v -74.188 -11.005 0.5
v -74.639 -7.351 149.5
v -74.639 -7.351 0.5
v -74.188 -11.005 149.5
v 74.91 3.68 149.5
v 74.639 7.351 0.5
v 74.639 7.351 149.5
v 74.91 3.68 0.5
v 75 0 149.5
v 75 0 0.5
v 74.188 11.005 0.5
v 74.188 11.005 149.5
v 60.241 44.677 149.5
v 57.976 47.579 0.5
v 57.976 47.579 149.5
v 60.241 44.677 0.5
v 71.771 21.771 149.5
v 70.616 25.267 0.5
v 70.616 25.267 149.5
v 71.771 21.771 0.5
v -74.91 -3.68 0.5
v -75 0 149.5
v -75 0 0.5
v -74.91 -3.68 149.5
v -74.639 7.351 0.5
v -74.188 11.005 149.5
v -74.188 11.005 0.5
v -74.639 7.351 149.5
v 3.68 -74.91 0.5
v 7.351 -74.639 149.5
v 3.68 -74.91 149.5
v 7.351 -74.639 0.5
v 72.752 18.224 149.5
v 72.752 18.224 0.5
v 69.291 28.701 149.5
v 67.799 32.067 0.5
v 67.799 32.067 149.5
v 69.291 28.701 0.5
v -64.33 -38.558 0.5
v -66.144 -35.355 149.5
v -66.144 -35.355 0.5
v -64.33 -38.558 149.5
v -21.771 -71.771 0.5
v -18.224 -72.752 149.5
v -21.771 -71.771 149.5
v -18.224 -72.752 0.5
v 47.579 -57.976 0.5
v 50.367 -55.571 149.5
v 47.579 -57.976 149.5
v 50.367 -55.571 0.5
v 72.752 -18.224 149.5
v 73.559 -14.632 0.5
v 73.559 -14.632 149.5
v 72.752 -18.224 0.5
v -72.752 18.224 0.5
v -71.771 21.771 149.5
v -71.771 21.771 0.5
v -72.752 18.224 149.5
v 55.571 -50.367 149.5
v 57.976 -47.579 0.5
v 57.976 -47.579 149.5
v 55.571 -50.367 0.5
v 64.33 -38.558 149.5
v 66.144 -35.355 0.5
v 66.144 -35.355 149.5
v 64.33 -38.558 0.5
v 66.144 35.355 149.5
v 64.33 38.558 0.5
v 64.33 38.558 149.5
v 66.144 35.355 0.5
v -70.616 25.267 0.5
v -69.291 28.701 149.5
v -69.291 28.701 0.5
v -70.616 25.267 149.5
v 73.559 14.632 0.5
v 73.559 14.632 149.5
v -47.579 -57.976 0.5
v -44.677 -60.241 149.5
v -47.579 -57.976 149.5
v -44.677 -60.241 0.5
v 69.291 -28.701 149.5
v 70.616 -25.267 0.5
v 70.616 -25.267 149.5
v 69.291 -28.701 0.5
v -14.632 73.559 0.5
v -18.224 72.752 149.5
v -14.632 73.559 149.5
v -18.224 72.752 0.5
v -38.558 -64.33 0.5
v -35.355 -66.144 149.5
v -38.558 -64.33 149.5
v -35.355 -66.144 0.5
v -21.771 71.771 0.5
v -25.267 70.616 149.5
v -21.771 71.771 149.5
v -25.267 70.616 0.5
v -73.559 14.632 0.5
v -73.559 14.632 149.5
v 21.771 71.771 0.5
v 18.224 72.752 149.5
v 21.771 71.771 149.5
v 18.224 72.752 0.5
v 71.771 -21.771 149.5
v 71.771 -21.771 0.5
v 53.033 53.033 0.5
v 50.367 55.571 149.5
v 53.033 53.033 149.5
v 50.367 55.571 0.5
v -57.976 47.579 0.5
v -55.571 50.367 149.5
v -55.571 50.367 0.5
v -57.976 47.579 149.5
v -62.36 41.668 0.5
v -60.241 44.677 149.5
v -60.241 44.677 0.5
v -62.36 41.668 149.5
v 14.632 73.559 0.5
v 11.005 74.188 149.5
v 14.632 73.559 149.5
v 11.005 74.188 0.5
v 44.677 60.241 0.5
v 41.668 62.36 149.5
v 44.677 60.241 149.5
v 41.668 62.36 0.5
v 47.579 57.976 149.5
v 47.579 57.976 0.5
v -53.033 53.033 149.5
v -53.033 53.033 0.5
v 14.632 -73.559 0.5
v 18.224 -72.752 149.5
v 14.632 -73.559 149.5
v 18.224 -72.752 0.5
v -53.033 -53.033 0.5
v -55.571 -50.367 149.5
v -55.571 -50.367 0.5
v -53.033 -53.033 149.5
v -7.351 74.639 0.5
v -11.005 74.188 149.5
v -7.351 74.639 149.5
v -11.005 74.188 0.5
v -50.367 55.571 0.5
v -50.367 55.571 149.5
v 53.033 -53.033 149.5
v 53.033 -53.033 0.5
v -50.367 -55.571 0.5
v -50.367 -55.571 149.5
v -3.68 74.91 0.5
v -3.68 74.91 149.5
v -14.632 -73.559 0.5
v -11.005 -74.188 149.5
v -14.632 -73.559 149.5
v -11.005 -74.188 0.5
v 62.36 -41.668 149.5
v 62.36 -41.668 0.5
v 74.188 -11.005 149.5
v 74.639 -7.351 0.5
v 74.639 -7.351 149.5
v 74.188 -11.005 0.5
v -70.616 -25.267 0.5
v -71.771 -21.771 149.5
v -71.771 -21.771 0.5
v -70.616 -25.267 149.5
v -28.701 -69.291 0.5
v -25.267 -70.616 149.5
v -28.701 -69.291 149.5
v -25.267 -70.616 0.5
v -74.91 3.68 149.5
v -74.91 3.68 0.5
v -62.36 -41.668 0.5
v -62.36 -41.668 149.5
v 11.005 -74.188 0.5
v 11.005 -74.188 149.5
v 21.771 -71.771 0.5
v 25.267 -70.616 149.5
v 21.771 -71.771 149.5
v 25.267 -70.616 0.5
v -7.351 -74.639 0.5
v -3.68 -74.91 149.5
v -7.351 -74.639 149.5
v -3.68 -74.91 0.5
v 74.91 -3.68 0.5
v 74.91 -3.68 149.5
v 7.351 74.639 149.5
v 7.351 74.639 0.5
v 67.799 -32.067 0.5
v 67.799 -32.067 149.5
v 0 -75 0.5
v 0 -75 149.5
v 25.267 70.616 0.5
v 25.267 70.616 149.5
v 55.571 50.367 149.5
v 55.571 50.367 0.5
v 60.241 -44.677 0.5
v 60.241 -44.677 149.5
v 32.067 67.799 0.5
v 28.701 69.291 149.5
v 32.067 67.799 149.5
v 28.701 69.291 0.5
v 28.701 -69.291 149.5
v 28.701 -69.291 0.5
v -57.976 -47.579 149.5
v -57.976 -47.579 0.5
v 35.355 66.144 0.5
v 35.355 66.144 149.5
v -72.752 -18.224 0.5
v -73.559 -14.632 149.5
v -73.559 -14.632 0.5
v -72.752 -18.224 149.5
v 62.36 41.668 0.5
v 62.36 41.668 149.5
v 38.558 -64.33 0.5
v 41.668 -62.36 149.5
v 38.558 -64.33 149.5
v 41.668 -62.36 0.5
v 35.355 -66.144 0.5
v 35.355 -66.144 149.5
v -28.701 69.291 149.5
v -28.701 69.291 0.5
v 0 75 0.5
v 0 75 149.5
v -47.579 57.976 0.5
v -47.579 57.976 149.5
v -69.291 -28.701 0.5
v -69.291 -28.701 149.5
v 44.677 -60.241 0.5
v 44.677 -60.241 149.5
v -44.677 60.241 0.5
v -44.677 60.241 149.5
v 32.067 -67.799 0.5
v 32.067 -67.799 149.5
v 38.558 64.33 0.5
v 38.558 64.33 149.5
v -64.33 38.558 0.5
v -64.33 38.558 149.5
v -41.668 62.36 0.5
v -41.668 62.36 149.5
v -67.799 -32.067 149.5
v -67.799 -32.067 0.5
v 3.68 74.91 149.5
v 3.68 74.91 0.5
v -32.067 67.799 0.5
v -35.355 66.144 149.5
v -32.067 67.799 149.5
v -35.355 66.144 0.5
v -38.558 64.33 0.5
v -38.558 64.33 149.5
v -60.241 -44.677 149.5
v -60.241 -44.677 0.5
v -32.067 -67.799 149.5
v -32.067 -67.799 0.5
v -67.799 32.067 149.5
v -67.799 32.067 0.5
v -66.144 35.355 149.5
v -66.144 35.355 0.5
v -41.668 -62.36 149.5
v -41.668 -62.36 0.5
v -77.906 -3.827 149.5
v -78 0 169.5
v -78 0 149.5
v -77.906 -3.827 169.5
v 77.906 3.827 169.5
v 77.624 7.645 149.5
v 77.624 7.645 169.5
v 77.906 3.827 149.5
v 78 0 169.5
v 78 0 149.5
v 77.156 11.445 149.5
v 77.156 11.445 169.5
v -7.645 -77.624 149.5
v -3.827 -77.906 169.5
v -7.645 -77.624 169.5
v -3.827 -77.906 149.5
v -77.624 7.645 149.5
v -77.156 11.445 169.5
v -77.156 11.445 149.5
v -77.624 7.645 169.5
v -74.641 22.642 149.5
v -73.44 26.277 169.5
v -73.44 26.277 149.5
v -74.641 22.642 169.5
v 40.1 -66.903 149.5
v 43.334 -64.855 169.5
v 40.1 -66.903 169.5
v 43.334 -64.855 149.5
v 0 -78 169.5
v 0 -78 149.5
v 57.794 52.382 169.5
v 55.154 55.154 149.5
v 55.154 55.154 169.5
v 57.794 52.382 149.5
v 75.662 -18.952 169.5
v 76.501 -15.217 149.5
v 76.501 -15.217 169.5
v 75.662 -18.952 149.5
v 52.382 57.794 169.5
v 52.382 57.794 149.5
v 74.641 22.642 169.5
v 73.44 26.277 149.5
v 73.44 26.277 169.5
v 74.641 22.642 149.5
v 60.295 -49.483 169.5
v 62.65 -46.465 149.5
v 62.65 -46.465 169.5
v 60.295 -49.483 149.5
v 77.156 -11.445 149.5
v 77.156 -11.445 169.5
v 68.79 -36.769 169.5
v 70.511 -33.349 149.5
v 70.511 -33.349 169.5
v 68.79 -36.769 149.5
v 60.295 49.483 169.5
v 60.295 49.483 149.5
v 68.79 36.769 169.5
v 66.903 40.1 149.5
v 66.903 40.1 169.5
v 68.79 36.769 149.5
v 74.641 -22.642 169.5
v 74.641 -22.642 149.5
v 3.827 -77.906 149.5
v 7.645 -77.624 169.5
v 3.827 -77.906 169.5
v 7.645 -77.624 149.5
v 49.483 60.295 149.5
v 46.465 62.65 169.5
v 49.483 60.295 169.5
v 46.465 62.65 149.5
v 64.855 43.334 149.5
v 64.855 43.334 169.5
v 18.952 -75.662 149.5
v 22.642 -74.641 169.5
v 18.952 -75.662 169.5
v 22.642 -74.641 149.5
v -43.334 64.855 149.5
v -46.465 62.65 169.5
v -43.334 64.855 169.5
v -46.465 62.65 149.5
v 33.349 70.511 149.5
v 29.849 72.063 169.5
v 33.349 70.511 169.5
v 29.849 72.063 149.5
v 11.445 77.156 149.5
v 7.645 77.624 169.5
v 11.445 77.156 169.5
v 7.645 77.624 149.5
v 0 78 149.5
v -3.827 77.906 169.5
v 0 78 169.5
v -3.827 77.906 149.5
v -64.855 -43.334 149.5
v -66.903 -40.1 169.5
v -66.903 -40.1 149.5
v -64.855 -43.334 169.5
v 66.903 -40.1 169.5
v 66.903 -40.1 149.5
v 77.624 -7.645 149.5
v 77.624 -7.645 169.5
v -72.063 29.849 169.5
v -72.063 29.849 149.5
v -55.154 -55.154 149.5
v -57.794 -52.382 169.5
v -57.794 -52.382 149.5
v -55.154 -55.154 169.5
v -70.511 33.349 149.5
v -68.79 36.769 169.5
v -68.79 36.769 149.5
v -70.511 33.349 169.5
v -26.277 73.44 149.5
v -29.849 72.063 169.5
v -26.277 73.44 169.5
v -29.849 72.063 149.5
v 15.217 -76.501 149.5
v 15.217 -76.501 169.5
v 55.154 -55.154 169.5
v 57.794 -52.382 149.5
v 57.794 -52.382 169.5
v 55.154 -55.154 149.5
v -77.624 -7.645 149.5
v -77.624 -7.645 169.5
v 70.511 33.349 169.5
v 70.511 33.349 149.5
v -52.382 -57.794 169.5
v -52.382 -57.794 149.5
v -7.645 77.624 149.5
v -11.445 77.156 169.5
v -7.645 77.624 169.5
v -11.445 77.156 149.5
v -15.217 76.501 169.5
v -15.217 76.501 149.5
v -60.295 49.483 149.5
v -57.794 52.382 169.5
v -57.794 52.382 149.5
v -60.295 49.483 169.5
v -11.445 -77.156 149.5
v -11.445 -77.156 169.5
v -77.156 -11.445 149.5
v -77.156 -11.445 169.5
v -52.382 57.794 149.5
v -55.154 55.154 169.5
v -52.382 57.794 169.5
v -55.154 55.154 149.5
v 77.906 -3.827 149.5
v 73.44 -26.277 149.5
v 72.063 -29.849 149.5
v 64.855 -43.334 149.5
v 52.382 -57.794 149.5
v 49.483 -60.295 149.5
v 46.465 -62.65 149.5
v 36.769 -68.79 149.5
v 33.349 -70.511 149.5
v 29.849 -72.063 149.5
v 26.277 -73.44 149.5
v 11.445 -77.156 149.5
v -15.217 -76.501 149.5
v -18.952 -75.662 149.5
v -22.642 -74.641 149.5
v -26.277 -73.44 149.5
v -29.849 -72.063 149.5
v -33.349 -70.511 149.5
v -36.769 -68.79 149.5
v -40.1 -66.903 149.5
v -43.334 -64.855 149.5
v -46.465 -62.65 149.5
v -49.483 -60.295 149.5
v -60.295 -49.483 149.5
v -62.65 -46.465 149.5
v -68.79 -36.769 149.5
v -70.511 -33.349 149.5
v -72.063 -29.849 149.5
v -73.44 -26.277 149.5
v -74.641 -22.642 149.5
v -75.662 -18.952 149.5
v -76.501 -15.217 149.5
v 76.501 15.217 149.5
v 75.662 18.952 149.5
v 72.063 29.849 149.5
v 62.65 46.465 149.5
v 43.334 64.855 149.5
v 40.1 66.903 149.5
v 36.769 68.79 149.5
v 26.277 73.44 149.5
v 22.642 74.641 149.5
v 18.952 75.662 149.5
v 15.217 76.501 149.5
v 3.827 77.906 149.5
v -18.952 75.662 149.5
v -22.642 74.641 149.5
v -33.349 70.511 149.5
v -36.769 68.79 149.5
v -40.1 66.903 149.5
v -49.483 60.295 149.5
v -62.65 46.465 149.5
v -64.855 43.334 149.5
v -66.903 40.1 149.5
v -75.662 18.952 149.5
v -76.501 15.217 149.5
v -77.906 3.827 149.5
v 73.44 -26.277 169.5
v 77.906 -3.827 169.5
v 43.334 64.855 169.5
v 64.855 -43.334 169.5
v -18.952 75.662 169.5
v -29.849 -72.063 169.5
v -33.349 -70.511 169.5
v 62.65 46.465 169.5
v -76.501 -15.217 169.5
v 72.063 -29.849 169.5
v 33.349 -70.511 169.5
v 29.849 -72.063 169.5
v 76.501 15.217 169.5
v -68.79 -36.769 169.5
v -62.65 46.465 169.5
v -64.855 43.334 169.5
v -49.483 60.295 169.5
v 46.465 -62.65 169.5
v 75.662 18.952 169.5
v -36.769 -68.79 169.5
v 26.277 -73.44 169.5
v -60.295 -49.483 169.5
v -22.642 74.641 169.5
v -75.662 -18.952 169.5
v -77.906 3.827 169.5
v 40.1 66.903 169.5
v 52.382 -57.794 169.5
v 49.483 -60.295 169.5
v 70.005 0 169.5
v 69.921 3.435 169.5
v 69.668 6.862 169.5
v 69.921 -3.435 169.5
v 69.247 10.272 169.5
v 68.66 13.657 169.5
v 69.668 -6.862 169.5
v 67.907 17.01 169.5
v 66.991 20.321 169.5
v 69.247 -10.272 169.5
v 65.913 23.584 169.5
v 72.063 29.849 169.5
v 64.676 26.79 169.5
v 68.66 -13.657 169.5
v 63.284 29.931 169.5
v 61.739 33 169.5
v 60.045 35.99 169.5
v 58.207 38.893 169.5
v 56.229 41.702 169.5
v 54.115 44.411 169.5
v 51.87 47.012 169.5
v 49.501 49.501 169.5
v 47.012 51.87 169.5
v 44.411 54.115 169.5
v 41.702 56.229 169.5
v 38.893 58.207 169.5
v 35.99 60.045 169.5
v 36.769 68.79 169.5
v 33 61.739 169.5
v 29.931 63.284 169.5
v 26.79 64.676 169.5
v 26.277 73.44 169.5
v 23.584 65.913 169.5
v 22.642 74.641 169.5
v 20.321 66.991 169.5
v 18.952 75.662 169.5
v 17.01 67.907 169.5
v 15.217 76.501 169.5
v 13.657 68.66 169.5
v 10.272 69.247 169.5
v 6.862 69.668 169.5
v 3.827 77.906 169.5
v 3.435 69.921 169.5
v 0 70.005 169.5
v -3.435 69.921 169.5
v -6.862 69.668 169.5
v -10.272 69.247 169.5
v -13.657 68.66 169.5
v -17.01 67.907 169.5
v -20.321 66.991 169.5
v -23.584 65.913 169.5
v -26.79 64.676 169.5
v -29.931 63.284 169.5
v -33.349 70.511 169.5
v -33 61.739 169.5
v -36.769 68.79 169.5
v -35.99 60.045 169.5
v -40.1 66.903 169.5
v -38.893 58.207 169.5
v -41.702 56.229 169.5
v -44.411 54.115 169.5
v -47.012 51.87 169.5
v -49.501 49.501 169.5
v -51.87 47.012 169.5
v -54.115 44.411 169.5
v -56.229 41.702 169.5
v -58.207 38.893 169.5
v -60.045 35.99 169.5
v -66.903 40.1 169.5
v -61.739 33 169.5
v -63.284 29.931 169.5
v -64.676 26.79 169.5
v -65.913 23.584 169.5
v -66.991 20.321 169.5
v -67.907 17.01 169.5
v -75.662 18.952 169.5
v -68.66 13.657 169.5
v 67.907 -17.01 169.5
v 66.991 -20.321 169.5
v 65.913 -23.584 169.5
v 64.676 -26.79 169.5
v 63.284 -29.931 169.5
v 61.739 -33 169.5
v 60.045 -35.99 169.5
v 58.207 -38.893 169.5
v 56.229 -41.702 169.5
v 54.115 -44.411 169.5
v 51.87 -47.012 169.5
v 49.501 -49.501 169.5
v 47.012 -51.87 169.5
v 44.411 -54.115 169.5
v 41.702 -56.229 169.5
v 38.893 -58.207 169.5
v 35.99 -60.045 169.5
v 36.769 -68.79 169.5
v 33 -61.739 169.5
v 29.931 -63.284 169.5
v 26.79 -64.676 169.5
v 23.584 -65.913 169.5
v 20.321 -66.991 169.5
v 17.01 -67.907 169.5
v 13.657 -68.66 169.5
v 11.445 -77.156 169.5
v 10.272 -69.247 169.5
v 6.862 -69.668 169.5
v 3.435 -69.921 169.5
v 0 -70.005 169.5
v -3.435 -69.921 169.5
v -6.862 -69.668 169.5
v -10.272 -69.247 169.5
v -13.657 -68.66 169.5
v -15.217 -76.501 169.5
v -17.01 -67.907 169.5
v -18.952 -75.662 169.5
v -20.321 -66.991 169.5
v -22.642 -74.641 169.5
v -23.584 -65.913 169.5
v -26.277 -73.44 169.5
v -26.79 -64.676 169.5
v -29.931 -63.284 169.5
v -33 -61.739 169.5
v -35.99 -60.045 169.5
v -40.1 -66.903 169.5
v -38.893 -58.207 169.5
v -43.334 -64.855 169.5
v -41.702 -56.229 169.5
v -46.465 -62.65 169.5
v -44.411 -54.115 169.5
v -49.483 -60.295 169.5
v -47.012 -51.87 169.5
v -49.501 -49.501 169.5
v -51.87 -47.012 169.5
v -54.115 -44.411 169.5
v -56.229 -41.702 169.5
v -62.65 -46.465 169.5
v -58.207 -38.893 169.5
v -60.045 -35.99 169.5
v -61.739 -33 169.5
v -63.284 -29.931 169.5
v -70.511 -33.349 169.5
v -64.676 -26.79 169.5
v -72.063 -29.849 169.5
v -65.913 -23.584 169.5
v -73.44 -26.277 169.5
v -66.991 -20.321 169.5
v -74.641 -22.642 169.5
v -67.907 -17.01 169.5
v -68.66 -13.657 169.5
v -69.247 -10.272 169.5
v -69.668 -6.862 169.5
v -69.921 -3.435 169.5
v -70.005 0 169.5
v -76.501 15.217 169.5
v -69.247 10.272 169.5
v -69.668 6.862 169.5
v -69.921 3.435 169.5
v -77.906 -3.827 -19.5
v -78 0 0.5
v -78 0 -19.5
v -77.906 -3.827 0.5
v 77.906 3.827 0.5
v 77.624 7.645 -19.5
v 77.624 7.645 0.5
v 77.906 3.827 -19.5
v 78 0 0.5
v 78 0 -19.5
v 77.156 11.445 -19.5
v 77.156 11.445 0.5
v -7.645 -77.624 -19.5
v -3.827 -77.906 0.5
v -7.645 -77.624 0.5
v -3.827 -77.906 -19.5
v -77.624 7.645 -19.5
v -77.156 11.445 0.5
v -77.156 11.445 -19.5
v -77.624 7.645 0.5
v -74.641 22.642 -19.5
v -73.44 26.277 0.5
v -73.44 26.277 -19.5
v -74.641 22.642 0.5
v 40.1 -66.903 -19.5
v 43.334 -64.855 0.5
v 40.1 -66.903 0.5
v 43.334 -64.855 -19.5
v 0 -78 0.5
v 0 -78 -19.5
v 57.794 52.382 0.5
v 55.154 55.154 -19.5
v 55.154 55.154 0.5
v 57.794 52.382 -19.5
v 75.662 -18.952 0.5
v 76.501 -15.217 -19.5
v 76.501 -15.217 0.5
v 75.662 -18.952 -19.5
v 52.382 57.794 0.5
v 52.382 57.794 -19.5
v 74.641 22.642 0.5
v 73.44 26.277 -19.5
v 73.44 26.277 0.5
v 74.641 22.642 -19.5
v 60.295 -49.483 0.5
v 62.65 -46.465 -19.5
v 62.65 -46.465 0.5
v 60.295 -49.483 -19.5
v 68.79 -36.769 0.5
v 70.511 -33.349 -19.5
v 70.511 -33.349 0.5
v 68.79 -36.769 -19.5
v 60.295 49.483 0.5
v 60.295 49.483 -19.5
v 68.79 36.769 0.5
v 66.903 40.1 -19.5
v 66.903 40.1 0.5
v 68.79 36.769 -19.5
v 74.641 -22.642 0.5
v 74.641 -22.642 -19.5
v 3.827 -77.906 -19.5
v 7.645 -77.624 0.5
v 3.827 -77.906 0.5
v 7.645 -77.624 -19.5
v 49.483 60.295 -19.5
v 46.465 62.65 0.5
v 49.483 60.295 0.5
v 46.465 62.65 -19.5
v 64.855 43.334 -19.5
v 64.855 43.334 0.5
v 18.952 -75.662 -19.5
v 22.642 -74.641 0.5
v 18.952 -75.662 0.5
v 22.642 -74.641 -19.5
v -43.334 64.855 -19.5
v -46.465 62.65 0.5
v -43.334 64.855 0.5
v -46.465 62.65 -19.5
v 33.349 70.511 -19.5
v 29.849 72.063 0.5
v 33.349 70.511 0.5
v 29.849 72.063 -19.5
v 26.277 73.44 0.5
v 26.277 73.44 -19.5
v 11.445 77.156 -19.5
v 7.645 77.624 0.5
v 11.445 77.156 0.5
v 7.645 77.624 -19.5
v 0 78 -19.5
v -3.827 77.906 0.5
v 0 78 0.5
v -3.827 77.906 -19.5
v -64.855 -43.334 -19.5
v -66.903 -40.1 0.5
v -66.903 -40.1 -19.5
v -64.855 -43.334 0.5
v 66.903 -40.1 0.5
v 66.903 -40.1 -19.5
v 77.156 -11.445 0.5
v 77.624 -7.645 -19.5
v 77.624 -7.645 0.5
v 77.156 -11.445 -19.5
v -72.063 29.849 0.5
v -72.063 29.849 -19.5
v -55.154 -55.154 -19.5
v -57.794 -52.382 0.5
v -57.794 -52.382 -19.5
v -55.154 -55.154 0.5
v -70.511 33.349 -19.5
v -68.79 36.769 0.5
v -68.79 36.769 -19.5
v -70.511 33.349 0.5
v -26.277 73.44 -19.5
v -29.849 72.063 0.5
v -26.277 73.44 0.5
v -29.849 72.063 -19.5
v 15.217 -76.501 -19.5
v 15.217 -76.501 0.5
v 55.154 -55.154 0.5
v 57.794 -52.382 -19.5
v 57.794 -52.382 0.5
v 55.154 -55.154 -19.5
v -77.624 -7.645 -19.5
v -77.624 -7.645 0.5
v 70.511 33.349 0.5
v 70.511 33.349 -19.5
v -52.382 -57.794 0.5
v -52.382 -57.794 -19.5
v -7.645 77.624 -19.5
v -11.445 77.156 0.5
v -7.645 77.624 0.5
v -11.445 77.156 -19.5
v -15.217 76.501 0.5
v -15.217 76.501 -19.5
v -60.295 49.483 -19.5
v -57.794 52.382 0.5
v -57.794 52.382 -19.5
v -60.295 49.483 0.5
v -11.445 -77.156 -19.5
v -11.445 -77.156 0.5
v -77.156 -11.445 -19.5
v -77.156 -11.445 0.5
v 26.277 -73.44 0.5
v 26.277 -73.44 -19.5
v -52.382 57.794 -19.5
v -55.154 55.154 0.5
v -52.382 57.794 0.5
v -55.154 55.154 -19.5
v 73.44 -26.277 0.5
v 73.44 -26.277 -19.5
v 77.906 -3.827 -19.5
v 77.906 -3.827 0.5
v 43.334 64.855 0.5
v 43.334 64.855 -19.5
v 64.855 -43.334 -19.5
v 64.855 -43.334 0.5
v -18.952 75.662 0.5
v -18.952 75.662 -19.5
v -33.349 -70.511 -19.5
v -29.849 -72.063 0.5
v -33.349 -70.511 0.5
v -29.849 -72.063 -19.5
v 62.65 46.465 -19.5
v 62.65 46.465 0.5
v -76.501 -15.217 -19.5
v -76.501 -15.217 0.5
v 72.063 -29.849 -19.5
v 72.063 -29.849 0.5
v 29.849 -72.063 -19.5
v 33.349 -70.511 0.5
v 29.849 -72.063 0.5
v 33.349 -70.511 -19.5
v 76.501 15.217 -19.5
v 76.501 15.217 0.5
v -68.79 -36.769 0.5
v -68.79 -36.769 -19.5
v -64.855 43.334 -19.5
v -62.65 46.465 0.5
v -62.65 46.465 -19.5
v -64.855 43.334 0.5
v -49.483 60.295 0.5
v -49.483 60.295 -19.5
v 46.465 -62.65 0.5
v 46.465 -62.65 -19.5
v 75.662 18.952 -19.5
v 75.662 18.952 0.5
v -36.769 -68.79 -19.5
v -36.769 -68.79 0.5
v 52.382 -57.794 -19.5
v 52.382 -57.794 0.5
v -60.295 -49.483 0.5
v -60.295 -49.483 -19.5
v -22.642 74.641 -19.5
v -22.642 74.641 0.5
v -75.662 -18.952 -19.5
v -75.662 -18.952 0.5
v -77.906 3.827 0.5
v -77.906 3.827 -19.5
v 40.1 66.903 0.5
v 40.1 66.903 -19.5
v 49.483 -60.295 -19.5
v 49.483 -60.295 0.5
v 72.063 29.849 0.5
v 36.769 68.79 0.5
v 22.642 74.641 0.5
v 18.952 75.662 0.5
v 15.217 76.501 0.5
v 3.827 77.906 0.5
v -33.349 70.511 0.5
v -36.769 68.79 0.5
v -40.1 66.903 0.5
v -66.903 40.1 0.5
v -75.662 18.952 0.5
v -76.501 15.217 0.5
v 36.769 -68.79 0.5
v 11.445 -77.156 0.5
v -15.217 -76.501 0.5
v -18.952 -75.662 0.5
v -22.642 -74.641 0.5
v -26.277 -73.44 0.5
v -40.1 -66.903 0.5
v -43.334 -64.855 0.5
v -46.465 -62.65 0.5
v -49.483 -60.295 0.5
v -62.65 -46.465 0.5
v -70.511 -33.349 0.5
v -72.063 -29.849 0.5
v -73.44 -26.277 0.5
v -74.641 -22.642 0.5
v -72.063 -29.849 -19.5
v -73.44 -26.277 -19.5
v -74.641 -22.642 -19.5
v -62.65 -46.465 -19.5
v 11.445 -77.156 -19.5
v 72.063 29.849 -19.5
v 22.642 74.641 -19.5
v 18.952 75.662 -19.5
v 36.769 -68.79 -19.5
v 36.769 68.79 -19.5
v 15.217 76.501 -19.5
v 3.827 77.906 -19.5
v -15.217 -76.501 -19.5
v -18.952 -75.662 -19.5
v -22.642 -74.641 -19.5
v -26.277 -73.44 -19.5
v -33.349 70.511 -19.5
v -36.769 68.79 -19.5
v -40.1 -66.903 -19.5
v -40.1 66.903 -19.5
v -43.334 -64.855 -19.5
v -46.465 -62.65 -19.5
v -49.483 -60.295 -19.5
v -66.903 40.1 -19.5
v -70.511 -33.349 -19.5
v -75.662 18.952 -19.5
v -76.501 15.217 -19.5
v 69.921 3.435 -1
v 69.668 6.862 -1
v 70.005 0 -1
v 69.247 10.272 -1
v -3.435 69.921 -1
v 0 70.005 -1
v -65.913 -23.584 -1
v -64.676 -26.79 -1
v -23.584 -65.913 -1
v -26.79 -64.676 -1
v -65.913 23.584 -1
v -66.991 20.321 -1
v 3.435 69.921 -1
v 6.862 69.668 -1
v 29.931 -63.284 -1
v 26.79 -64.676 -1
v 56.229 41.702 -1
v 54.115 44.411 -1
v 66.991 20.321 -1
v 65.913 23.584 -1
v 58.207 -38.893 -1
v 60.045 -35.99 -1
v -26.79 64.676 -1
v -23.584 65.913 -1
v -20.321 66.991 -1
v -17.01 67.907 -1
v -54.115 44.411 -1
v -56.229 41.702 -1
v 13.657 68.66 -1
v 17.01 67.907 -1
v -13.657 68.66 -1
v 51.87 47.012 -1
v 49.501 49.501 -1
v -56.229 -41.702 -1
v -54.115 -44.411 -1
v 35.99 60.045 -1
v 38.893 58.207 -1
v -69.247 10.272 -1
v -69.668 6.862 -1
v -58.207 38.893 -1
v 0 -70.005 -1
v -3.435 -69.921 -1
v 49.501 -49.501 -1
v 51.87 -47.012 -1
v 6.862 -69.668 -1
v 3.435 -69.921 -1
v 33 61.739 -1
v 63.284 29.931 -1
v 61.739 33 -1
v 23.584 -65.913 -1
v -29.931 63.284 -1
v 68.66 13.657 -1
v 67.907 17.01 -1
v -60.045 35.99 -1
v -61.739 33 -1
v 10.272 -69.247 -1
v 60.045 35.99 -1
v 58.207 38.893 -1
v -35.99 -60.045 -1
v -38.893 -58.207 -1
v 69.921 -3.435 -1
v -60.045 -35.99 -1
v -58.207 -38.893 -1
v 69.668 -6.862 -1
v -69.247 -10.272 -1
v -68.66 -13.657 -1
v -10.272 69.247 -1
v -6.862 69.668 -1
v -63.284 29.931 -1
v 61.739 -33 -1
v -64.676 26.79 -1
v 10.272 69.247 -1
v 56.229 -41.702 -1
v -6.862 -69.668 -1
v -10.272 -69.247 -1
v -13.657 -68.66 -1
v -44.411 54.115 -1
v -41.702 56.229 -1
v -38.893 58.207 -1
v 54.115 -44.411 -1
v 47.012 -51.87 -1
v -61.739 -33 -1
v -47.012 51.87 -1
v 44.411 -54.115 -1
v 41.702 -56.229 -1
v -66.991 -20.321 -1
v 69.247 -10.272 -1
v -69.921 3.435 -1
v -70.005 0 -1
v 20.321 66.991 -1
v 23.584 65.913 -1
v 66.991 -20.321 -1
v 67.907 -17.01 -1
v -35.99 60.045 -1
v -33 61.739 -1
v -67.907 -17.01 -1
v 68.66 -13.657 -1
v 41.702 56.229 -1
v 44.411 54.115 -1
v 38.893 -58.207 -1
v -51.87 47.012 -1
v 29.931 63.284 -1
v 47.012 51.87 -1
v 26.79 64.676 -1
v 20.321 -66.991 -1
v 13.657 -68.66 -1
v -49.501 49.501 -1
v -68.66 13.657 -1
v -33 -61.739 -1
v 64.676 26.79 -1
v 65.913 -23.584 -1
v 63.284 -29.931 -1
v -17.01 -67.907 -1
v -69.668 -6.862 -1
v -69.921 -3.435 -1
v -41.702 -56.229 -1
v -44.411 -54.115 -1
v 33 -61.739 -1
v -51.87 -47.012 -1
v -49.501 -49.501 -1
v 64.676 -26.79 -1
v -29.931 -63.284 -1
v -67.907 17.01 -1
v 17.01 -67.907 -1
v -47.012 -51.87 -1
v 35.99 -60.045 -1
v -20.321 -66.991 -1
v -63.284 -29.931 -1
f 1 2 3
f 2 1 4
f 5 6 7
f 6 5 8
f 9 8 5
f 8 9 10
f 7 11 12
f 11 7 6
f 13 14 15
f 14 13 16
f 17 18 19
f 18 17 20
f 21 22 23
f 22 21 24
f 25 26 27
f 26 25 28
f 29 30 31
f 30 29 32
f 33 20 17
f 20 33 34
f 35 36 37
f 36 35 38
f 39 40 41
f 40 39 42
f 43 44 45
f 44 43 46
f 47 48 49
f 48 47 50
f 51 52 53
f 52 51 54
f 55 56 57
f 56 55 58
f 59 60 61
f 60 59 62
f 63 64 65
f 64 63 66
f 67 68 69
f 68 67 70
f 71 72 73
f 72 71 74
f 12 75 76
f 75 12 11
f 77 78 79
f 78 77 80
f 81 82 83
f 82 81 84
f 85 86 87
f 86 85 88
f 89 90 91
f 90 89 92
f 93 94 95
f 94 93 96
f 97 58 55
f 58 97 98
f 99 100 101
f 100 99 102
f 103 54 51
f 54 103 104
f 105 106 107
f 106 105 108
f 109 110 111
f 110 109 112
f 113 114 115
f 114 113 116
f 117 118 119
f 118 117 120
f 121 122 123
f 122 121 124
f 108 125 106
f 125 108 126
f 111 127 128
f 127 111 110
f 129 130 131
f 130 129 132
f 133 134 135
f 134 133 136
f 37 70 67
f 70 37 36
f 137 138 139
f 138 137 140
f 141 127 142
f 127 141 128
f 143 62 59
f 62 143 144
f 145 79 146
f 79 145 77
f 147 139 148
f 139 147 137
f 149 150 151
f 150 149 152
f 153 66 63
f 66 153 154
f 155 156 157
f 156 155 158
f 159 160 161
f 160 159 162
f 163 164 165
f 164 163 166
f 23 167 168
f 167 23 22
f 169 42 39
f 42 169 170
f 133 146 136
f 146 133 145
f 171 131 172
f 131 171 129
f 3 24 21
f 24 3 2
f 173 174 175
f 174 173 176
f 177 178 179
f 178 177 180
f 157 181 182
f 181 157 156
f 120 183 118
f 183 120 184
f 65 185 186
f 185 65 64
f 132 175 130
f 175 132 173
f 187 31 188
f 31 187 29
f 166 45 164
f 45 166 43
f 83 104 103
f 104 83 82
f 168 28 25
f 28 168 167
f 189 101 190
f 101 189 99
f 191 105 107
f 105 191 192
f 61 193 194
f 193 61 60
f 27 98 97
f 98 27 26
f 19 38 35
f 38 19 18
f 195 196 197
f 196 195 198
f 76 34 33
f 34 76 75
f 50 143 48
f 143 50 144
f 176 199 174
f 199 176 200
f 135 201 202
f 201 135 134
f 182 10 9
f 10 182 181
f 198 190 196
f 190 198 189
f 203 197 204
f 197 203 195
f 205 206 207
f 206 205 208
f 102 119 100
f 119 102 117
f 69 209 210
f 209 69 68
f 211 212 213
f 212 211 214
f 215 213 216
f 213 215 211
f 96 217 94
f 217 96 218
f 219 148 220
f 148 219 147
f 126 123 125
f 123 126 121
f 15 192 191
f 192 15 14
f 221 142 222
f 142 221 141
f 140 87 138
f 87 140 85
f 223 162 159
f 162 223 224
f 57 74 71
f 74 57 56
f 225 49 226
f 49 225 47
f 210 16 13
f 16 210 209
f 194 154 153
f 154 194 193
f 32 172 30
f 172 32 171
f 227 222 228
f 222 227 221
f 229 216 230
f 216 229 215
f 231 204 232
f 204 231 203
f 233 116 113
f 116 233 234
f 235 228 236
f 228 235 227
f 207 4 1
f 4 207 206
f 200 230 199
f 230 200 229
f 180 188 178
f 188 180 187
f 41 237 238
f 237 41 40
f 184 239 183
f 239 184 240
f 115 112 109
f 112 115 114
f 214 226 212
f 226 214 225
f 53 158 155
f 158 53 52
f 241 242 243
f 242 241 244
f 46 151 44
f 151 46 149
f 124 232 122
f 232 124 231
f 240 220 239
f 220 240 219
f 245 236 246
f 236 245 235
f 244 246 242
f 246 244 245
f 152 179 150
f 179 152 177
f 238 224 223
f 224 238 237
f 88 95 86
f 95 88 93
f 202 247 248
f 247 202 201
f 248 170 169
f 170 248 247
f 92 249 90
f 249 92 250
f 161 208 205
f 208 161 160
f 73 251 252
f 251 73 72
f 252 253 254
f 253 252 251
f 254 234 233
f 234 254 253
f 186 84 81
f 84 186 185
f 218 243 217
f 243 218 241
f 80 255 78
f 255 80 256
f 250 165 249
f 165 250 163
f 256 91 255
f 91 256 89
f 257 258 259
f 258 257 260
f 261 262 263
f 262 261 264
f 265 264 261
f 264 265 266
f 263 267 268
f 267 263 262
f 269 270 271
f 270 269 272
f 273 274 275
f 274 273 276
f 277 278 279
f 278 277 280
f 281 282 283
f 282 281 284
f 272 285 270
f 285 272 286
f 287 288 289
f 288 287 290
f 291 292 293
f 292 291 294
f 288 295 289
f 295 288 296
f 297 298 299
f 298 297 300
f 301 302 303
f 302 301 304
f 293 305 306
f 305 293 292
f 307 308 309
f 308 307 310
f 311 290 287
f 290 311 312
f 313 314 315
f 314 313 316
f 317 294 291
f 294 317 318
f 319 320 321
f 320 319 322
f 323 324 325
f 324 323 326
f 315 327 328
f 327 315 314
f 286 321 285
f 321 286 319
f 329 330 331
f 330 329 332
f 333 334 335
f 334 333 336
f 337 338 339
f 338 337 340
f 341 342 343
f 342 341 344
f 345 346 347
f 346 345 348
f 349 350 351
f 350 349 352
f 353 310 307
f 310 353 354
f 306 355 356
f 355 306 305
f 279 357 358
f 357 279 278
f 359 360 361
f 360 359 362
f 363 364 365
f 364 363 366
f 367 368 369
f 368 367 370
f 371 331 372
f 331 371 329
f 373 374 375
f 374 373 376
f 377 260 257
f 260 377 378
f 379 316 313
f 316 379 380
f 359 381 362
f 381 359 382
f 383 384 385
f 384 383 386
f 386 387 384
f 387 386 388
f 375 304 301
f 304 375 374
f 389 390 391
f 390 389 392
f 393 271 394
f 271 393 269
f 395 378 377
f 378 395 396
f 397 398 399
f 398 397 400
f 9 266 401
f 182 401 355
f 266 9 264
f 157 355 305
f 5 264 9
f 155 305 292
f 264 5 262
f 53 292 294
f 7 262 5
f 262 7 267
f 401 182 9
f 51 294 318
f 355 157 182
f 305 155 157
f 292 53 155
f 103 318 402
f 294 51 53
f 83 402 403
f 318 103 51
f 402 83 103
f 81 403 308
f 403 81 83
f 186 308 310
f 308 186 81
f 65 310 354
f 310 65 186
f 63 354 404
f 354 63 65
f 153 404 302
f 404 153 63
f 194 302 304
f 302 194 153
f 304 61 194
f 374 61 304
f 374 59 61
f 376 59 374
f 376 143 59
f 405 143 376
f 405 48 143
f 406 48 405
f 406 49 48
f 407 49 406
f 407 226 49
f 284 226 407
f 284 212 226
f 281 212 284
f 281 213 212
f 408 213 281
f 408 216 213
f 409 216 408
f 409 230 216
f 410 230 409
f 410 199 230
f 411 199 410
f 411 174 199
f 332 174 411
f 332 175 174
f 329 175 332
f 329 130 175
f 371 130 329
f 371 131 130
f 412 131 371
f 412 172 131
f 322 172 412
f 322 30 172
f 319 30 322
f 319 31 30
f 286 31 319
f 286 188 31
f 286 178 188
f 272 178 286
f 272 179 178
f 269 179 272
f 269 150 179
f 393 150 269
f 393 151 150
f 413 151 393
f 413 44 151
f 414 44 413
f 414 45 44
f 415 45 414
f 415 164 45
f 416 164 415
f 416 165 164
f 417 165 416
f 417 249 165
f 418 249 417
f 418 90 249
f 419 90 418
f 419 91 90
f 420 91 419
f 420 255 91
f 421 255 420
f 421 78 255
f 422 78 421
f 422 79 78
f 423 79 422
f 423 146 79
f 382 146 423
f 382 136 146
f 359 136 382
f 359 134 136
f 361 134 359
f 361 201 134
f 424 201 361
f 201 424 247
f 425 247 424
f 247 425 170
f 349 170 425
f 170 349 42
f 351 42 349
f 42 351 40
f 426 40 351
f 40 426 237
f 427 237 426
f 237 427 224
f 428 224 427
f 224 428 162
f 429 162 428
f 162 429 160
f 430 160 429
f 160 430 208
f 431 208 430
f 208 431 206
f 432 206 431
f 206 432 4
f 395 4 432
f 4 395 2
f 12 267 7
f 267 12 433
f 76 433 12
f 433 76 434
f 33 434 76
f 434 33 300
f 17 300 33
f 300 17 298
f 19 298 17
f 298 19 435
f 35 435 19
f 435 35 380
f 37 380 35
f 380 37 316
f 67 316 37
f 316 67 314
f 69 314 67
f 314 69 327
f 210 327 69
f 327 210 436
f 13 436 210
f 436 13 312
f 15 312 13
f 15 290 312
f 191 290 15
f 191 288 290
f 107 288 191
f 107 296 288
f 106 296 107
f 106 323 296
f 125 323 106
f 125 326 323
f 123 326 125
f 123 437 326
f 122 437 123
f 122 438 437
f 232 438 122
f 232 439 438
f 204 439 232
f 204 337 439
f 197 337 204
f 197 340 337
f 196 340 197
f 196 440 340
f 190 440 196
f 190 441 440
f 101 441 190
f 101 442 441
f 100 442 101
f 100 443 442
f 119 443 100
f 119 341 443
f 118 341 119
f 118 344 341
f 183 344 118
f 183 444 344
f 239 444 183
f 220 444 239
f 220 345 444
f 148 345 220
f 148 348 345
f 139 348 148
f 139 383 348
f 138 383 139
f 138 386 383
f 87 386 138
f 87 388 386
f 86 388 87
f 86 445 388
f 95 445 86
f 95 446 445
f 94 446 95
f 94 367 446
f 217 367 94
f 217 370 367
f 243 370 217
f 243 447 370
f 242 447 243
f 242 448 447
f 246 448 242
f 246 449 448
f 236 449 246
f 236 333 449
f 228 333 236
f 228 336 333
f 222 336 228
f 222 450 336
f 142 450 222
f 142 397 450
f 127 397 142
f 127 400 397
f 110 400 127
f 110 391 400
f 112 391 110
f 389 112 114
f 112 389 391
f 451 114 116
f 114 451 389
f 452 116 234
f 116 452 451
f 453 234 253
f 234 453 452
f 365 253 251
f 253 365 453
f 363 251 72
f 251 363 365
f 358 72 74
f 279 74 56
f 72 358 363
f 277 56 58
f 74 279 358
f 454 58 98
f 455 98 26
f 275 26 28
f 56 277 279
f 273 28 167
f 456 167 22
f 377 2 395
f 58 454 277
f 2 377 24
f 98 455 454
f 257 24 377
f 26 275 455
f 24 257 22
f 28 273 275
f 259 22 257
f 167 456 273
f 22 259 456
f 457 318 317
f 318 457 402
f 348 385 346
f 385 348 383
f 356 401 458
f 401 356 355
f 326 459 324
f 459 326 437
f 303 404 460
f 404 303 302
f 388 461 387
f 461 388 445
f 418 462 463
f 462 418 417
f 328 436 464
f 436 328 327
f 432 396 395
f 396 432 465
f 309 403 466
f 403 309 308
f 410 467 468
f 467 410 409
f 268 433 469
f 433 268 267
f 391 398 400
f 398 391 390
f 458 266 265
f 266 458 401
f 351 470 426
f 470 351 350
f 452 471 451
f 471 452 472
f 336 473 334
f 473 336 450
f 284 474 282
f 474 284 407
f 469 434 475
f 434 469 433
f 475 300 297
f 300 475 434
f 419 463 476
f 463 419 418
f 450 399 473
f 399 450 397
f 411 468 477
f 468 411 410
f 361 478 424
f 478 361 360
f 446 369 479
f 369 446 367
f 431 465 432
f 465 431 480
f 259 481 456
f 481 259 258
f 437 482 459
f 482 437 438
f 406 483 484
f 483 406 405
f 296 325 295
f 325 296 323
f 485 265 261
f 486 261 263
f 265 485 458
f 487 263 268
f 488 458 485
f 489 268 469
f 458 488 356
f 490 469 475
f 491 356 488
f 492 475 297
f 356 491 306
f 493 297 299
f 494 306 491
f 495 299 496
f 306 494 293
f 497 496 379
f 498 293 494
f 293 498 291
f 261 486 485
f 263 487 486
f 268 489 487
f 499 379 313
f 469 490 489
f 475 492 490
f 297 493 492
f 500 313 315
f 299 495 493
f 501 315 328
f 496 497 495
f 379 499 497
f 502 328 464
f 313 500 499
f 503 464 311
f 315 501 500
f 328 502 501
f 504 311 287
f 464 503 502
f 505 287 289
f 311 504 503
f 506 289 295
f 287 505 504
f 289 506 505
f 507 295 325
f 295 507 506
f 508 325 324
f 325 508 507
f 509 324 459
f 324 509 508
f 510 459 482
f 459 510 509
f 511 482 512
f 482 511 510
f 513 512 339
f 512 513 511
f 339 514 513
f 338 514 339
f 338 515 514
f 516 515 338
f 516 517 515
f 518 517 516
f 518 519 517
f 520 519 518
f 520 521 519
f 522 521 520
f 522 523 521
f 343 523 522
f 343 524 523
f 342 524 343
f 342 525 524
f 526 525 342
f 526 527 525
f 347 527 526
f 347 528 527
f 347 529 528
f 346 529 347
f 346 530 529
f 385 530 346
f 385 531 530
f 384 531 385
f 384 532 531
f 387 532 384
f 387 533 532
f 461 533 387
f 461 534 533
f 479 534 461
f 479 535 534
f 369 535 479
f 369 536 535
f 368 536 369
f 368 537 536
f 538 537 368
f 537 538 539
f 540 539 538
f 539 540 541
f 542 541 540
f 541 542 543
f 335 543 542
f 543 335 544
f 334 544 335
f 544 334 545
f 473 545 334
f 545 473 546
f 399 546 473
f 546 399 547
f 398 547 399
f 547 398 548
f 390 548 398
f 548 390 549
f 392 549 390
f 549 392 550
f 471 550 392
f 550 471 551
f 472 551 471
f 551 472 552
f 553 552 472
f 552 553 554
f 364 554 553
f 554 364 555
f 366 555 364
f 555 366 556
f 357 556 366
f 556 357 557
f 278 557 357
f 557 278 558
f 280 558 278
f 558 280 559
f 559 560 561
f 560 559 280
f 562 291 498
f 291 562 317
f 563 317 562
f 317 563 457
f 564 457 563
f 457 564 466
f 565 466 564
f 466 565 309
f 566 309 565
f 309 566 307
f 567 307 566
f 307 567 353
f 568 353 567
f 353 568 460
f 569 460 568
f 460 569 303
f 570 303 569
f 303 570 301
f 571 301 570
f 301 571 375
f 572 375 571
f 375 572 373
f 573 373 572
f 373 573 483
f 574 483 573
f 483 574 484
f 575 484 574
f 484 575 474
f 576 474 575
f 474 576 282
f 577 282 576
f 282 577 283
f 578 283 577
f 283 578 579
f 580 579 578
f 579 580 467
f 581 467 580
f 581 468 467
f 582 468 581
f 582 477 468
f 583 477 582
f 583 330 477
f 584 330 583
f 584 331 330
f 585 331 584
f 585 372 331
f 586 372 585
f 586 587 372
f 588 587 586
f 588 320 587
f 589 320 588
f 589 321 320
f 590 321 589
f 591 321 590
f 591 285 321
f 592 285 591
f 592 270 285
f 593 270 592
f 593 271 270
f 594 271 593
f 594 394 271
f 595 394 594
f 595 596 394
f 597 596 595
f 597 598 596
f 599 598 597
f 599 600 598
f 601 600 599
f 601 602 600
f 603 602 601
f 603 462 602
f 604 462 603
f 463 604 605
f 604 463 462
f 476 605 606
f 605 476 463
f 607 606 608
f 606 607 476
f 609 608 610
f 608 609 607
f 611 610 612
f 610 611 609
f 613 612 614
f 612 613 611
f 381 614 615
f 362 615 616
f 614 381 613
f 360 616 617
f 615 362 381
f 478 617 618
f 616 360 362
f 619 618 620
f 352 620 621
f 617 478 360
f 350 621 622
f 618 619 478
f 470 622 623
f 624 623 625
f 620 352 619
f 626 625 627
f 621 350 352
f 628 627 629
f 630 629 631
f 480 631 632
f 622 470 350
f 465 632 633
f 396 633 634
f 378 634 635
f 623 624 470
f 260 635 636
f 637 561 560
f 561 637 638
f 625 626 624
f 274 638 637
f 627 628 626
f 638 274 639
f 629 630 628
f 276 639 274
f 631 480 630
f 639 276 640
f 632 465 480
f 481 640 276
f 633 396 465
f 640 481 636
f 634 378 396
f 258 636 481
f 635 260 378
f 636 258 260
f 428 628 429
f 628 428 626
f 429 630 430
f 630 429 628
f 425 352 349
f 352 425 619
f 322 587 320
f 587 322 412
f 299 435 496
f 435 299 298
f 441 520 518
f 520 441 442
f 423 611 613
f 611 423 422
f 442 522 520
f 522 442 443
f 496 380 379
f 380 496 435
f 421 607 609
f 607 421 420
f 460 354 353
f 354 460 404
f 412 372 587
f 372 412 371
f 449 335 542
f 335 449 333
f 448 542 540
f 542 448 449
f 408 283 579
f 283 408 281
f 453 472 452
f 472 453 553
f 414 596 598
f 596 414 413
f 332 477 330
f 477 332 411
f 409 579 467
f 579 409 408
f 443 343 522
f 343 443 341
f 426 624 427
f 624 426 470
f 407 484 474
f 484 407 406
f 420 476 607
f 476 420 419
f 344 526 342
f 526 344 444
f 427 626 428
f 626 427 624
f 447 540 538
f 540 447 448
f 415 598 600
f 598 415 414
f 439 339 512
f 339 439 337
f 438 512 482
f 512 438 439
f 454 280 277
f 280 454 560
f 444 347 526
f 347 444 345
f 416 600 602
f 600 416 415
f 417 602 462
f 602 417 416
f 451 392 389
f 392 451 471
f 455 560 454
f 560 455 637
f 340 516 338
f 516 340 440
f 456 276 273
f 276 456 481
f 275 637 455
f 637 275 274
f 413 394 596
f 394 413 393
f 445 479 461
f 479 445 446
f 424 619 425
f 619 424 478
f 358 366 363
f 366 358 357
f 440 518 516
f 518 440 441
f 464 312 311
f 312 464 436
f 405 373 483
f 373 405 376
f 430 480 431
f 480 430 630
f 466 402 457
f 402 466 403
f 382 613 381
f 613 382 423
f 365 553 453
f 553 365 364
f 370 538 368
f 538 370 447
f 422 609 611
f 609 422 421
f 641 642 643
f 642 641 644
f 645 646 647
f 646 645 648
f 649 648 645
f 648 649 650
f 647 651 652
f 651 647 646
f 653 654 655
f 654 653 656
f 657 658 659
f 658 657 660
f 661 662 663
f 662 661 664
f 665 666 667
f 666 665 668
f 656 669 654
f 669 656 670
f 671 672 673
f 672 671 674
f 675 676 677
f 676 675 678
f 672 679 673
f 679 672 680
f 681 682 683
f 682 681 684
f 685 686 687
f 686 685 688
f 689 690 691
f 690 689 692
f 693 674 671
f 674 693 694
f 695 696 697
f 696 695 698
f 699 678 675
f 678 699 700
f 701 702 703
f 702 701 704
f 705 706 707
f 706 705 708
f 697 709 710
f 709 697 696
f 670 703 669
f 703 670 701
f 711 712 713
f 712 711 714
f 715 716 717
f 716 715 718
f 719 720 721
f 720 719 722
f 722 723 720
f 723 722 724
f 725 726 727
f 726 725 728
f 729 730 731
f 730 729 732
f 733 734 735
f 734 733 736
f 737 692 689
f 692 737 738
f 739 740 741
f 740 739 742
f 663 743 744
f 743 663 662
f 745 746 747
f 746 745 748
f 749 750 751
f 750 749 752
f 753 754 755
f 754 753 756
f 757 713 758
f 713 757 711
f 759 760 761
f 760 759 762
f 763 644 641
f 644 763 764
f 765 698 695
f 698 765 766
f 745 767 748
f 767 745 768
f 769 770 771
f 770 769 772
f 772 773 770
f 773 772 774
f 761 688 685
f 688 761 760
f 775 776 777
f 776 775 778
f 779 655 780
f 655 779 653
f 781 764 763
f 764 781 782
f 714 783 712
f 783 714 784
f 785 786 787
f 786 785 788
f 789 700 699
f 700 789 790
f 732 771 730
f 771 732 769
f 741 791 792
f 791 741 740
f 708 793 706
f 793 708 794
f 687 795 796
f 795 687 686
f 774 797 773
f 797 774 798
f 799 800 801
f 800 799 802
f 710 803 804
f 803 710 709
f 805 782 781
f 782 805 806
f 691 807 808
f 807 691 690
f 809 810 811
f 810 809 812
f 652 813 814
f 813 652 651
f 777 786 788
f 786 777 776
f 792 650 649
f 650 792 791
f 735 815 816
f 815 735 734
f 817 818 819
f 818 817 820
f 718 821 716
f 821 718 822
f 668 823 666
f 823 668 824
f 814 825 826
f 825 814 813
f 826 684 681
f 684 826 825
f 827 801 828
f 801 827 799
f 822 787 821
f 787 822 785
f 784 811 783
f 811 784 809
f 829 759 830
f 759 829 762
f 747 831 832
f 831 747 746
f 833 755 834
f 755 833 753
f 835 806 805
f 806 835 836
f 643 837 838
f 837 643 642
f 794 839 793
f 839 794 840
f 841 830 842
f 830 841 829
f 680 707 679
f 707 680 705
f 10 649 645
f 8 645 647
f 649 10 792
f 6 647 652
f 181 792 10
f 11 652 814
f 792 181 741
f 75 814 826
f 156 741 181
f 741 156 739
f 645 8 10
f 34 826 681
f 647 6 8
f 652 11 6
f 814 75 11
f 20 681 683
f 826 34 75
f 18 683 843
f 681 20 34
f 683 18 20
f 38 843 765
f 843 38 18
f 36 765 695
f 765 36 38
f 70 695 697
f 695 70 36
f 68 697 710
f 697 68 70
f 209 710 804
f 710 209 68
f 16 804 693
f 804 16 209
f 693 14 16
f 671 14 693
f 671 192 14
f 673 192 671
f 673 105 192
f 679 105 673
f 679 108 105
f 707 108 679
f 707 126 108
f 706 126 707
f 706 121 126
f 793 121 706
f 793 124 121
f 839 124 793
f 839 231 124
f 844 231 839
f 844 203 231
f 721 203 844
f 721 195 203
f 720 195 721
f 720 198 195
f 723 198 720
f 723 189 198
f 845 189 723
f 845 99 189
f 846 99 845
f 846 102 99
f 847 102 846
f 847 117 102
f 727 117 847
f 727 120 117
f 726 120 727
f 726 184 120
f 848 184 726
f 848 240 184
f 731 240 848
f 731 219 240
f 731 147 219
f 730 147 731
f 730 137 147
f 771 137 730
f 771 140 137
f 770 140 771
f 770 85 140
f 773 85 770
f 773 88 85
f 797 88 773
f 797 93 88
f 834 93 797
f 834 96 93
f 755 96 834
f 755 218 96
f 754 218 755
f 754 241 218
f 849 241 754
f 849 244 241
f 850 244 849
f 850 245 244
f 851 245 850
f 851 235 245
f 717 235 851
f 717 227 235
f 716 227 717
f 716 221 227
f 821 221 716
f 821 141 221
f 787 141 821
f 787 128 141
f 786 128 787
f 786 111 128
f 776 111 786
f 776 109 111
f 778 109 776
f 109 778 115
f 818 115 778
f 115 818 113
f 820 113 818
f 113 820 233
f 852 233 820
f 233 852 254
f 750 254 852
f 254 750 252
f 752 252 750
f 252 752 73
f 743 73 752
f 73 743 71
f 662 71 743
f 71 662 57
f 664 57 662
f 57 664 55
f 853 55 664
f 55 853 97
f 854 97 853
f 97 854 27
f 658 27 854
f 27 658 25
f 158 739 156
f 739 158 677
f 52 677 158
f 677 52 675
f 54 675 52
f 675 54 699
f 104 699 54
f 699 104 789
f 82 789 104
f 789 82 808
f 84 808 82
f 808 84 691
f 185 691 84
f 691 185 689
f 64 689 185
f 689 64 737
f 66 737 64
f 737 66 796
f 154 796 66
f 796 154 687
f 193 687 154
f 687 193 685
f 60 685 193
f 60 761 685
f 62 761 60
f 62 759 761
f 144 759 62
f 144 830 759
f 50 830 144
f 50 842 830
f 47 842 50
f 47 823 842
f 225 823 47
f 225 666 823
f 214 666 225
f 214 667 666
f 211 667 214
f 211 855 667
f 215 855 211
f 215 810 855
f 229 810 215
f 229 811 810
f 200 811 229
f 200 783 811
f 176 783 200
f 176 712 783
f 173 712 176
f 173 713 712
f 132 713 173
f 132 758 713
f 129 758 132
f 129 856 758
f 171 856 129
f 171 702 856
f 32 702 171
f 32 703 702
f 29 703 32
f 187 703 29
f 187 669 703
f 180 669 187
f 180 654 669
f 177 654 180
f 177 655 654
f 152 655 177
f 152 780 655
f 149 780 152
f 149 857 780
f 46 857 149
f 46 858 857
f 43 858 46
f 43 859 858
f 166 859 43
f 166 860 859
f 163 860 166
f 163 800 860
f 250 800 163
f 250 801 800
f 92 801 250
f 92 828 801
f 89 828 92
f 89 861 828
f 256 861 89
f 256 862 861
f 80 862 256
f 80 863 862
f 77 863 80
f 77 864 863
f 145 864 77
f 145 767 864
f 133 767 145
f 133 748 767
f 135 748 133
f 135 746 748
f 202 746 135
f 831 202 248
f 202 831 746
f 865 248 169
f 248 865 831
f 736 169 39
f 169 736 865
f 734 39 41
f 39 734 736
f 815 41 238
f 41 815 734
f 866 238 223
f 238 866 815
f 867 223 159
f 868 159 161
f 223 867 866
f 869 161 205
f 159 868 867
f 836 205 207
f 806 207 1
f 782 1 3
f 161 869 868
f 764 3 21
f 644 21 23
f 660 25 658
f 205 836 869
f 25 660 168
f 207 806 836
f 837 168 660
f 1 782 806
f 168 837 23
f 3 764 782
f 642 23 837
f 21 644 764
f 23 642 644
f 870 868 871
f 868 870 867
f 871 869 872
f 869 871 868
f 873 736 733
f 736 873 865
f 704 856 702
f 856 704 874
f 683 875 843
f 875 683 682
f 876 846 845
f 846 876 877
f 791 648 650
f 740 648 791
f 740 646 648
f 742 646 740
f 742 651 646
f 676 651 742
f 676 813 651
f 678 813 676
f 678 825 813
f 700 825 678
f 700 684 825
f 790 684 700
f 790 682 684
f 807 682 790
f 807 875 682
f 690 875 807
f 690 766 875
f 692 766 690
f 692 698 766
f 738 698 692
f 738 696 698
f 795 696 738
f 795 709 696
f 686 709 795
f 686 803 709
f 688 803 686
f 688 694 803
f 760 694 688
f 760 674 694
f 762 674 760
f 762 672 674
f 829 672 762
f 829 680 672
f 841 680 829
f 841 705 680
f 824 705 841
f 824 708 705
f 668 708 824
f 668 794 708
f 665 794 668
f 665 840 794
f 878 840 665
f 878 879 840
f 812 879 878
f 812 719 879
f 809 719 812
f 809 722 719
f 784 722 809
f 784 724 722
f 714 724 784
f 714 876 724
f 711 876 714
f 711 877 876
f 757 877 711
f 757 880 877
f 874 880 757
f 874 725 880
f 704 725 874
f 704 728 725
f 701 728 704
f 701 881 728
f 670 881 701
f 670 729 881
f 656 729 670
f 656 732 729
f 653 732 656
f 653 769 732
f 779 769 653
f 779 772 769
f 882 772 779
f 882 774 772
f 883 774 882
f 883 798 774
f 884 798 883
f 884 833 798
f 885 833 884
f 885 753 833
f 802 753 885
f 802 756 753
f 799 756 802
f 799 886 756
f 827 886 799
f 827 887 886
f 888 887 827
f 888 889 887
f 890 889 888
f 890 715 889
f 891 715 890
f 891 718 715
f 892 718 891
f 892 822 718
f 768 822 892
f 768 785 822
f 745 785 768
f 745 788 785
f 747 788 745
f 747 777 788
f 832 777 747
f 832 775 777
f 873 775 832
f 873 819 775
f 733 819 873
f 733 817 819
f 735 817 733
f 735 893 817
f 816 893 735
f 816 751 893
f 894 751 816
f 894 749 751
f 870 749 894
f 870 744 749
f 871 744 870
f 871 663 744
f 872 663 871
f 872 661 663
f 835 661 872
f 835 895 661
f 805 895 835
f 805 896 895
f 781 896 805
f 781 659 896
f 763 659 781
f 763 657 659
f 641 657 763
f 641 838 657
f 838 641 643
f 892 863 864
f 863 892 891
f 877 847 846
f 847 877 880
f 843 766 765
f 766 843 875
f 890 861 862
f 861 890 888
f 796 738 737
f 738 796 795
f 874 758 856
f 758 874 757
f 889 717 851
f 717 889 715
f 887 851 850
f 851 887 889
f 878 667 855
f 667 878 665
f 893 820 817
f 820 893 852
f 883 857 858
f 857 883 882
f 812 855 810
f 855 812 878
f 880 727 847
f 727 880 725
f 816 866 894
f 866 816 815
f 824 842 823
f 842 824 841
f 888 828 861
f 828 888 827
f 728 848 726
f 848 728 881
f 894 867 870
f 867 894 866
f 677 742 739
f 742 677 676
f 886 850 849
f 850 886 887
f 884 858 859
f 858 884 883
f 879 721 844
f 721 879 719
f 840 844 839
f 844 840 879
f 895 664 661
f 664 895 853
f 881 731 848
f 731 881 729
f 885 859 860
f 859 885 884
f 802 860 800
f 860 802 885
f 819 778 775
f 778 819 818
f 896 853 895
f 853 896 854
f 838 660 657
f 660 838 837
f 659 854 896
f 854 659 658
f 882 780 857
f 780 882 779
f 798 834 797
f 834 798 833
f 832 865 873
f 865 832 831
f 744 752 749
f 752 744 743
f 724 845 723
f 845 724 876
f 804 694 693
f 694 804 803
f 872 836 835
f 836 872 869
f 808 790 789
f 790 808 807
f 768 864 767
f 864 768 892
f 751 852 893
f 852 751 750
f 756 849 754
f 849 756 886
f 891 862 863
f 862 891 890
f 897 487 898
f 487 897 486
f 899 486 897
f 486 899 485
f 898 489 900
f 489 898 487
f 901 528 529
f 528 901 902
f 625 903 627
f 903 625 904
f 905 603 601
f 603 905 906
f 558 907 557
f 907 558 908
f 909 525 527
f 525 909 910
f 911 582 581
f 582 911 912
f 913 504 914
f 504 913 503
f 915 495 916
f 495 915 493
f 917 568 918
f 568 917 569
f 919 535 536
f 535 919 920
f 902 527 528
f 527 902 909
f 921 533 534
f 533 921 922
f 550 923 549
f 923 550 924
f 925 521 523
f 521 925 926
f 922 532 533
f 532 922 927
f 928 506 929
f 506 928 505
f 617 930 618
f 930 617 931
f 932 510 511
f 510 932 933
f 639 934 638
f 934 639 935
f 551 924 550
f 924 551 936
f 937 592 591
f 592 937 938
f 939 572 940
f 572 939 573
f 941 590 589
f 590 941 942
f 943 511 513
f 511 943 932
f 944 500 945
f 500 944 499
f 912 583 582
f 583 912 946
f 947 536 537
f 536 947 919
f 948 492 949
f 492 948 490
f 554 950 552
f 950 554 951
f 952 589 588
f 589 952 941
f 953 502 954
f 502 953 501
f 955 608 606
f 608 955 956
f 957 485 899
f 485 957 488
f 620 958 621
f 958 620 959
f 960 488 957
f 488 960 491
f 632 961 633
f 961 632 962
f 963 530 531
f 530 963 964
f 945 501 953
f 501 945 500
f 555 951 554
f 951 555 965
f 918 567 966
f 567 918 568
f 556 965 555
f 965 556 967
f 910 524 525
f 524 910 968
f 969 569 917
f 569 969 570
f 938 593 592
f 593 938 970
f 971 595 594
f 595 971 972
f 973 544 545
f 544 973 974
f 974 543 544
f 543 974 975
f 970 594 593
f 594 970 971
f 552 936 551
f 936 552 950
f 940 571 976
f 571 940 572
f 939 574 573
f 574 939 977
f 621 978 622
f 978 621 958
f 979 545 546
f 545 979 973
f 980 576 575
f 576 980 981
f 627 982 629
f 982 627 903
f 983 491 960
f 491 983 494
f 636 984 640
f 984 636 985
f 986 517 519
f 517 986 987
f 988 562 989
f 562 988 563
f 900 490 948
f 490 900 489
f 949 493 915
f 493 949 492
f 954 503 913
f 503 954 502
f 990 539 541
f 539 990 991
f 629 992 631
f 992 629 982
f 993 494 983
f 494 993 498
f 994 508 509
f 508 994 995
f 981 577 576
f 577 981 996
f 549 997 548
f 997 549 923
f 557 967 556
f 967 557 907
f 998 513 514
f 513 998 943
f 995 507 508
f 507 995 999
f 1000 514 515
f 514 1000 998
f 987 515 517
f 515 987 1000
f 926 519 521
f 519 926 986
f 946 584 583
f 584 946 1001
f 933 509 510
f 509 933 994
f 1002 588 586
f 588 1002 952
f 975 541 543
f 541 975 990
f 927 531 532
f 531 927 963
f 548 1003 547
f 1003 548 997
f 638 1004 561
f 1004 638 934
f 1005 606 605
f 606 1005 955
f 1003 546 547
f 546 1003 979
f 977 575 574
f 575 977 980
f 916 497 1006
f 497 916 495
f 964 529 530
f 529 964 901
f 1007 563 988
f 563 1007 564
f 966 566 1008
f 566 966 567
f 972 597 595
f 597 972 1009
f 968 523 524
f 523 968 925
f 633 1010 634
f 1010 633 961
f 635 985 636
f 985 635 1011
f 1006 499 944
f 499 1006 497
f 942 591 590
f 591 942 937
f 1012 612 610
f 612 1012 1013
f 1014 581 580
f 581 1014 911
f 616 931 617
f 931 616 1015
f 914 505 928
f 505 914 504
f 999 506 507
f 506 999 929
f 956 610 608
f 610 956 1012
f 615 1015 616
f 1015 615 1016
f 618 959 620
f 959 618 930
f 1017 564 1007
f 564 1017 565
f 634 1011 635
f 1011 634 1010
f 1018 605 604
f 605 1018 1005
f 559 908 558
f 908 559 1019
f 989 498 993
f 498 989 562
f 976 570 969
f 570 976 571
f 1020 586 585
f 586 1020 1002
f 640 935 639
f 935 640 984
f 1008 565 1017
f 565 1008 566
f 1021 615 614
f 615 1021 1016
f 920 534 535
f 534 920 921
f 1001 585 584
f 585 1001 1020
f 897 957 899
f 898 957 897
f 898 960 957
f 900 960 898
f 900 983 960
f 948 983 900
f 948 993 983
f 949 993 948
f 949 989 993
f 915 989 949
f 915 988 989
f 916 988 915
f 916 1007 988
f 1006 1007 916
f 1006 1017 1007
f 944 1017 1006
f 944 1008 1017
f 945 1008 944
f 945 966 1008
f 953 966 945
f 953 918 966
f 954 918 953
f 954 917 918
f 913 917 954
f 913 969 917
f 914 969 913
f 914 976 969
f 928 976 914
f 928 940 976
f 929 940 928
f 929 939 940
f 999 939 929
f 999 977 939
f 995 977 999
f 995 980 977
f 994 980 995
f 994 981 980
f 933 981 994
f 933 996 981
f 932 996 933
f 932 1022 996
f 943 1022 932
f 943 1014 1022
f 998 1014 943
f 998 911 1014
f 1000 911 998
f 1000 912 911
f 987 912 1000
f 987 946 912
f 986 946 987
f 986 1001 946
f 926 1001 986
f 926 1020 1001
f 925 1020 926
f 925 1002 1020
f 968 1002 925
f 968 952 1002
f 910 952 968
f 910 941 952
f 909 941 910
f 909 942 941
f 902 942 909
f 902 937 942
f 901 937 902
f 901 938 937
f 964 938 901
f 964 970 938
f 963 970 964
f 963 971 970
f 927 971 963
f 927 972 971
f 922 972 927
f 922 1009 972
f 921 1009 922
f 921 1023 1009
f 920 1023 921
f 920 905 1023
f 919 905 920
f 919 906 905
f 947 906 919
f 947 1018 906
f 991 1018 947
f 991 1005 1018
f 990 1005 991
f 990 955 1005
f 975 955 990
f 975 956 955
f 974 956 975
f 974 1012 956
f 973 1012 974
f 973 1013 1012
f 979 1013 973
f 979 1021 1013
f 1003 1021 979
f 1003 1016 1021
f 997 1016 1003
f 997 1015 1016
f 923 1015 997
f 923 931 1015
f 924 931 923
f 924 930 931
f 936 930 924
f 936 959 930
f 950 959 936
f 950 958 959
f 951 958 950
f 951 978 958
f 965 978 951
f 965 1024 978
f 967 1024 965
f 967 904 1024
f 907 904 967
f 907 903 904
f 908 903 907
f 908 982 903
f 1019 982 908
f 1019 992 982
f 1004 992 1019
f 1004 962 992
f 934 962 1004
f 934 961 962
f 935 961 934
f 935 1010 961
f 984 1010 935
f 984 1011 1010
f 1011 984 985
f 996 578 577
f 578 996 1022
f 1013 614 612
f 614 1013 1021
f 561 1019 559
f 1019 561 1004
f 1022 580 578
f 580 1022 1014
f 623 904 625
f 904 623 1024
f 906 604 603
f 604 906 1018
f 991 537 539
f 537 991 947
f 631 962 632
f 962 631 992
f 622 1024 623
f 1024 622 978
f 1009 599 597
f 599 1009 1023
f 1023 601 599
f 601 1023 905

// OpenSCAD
$fn = 128;

module ht_pipe(d_outer=150, length=150, wall=5, socket_len=20, socket_wall_extra=3, overlap=0.5) {
    d_inner = d_outer - 2*wall;
    d_socket_outer = d_outer + 2*socket_wall_extra;

    // Robustness epsilons to avoid coincident faces (blank/empty renders)
    eps = 0.01;
    bore_extra = 2; // ensures full cut-through

    difference() {
        union() {
            // Main outer body (not centered to keep end math simple)
            cylinder(d=d_outer, h=length, center=false);

            // Integrated sockets on both ends (overlap into body for connectivity)
            translate([0, 0, length - overlap])
                cylinder(d=d_socket_outer, h=socket_len, center=false);

            translate([0, 0, -socket_len + overlap])
                cylinder(d=d_socket_outer, h=socket_len, center=false);
        }

        // Continuous through-bore (slightly extended and slightly larger to avoid z-fighting)
        translate([0, 0, -bore_extra/2])
            cylinder(d=d_inner + eps, h=length + 2*socket_len + bore_extra, center=false);
    }
}

ht_pipe(d_outer=150, length=150, wall=5, socket_len=20, socket_wall_extra=3, overlap=0.5);
